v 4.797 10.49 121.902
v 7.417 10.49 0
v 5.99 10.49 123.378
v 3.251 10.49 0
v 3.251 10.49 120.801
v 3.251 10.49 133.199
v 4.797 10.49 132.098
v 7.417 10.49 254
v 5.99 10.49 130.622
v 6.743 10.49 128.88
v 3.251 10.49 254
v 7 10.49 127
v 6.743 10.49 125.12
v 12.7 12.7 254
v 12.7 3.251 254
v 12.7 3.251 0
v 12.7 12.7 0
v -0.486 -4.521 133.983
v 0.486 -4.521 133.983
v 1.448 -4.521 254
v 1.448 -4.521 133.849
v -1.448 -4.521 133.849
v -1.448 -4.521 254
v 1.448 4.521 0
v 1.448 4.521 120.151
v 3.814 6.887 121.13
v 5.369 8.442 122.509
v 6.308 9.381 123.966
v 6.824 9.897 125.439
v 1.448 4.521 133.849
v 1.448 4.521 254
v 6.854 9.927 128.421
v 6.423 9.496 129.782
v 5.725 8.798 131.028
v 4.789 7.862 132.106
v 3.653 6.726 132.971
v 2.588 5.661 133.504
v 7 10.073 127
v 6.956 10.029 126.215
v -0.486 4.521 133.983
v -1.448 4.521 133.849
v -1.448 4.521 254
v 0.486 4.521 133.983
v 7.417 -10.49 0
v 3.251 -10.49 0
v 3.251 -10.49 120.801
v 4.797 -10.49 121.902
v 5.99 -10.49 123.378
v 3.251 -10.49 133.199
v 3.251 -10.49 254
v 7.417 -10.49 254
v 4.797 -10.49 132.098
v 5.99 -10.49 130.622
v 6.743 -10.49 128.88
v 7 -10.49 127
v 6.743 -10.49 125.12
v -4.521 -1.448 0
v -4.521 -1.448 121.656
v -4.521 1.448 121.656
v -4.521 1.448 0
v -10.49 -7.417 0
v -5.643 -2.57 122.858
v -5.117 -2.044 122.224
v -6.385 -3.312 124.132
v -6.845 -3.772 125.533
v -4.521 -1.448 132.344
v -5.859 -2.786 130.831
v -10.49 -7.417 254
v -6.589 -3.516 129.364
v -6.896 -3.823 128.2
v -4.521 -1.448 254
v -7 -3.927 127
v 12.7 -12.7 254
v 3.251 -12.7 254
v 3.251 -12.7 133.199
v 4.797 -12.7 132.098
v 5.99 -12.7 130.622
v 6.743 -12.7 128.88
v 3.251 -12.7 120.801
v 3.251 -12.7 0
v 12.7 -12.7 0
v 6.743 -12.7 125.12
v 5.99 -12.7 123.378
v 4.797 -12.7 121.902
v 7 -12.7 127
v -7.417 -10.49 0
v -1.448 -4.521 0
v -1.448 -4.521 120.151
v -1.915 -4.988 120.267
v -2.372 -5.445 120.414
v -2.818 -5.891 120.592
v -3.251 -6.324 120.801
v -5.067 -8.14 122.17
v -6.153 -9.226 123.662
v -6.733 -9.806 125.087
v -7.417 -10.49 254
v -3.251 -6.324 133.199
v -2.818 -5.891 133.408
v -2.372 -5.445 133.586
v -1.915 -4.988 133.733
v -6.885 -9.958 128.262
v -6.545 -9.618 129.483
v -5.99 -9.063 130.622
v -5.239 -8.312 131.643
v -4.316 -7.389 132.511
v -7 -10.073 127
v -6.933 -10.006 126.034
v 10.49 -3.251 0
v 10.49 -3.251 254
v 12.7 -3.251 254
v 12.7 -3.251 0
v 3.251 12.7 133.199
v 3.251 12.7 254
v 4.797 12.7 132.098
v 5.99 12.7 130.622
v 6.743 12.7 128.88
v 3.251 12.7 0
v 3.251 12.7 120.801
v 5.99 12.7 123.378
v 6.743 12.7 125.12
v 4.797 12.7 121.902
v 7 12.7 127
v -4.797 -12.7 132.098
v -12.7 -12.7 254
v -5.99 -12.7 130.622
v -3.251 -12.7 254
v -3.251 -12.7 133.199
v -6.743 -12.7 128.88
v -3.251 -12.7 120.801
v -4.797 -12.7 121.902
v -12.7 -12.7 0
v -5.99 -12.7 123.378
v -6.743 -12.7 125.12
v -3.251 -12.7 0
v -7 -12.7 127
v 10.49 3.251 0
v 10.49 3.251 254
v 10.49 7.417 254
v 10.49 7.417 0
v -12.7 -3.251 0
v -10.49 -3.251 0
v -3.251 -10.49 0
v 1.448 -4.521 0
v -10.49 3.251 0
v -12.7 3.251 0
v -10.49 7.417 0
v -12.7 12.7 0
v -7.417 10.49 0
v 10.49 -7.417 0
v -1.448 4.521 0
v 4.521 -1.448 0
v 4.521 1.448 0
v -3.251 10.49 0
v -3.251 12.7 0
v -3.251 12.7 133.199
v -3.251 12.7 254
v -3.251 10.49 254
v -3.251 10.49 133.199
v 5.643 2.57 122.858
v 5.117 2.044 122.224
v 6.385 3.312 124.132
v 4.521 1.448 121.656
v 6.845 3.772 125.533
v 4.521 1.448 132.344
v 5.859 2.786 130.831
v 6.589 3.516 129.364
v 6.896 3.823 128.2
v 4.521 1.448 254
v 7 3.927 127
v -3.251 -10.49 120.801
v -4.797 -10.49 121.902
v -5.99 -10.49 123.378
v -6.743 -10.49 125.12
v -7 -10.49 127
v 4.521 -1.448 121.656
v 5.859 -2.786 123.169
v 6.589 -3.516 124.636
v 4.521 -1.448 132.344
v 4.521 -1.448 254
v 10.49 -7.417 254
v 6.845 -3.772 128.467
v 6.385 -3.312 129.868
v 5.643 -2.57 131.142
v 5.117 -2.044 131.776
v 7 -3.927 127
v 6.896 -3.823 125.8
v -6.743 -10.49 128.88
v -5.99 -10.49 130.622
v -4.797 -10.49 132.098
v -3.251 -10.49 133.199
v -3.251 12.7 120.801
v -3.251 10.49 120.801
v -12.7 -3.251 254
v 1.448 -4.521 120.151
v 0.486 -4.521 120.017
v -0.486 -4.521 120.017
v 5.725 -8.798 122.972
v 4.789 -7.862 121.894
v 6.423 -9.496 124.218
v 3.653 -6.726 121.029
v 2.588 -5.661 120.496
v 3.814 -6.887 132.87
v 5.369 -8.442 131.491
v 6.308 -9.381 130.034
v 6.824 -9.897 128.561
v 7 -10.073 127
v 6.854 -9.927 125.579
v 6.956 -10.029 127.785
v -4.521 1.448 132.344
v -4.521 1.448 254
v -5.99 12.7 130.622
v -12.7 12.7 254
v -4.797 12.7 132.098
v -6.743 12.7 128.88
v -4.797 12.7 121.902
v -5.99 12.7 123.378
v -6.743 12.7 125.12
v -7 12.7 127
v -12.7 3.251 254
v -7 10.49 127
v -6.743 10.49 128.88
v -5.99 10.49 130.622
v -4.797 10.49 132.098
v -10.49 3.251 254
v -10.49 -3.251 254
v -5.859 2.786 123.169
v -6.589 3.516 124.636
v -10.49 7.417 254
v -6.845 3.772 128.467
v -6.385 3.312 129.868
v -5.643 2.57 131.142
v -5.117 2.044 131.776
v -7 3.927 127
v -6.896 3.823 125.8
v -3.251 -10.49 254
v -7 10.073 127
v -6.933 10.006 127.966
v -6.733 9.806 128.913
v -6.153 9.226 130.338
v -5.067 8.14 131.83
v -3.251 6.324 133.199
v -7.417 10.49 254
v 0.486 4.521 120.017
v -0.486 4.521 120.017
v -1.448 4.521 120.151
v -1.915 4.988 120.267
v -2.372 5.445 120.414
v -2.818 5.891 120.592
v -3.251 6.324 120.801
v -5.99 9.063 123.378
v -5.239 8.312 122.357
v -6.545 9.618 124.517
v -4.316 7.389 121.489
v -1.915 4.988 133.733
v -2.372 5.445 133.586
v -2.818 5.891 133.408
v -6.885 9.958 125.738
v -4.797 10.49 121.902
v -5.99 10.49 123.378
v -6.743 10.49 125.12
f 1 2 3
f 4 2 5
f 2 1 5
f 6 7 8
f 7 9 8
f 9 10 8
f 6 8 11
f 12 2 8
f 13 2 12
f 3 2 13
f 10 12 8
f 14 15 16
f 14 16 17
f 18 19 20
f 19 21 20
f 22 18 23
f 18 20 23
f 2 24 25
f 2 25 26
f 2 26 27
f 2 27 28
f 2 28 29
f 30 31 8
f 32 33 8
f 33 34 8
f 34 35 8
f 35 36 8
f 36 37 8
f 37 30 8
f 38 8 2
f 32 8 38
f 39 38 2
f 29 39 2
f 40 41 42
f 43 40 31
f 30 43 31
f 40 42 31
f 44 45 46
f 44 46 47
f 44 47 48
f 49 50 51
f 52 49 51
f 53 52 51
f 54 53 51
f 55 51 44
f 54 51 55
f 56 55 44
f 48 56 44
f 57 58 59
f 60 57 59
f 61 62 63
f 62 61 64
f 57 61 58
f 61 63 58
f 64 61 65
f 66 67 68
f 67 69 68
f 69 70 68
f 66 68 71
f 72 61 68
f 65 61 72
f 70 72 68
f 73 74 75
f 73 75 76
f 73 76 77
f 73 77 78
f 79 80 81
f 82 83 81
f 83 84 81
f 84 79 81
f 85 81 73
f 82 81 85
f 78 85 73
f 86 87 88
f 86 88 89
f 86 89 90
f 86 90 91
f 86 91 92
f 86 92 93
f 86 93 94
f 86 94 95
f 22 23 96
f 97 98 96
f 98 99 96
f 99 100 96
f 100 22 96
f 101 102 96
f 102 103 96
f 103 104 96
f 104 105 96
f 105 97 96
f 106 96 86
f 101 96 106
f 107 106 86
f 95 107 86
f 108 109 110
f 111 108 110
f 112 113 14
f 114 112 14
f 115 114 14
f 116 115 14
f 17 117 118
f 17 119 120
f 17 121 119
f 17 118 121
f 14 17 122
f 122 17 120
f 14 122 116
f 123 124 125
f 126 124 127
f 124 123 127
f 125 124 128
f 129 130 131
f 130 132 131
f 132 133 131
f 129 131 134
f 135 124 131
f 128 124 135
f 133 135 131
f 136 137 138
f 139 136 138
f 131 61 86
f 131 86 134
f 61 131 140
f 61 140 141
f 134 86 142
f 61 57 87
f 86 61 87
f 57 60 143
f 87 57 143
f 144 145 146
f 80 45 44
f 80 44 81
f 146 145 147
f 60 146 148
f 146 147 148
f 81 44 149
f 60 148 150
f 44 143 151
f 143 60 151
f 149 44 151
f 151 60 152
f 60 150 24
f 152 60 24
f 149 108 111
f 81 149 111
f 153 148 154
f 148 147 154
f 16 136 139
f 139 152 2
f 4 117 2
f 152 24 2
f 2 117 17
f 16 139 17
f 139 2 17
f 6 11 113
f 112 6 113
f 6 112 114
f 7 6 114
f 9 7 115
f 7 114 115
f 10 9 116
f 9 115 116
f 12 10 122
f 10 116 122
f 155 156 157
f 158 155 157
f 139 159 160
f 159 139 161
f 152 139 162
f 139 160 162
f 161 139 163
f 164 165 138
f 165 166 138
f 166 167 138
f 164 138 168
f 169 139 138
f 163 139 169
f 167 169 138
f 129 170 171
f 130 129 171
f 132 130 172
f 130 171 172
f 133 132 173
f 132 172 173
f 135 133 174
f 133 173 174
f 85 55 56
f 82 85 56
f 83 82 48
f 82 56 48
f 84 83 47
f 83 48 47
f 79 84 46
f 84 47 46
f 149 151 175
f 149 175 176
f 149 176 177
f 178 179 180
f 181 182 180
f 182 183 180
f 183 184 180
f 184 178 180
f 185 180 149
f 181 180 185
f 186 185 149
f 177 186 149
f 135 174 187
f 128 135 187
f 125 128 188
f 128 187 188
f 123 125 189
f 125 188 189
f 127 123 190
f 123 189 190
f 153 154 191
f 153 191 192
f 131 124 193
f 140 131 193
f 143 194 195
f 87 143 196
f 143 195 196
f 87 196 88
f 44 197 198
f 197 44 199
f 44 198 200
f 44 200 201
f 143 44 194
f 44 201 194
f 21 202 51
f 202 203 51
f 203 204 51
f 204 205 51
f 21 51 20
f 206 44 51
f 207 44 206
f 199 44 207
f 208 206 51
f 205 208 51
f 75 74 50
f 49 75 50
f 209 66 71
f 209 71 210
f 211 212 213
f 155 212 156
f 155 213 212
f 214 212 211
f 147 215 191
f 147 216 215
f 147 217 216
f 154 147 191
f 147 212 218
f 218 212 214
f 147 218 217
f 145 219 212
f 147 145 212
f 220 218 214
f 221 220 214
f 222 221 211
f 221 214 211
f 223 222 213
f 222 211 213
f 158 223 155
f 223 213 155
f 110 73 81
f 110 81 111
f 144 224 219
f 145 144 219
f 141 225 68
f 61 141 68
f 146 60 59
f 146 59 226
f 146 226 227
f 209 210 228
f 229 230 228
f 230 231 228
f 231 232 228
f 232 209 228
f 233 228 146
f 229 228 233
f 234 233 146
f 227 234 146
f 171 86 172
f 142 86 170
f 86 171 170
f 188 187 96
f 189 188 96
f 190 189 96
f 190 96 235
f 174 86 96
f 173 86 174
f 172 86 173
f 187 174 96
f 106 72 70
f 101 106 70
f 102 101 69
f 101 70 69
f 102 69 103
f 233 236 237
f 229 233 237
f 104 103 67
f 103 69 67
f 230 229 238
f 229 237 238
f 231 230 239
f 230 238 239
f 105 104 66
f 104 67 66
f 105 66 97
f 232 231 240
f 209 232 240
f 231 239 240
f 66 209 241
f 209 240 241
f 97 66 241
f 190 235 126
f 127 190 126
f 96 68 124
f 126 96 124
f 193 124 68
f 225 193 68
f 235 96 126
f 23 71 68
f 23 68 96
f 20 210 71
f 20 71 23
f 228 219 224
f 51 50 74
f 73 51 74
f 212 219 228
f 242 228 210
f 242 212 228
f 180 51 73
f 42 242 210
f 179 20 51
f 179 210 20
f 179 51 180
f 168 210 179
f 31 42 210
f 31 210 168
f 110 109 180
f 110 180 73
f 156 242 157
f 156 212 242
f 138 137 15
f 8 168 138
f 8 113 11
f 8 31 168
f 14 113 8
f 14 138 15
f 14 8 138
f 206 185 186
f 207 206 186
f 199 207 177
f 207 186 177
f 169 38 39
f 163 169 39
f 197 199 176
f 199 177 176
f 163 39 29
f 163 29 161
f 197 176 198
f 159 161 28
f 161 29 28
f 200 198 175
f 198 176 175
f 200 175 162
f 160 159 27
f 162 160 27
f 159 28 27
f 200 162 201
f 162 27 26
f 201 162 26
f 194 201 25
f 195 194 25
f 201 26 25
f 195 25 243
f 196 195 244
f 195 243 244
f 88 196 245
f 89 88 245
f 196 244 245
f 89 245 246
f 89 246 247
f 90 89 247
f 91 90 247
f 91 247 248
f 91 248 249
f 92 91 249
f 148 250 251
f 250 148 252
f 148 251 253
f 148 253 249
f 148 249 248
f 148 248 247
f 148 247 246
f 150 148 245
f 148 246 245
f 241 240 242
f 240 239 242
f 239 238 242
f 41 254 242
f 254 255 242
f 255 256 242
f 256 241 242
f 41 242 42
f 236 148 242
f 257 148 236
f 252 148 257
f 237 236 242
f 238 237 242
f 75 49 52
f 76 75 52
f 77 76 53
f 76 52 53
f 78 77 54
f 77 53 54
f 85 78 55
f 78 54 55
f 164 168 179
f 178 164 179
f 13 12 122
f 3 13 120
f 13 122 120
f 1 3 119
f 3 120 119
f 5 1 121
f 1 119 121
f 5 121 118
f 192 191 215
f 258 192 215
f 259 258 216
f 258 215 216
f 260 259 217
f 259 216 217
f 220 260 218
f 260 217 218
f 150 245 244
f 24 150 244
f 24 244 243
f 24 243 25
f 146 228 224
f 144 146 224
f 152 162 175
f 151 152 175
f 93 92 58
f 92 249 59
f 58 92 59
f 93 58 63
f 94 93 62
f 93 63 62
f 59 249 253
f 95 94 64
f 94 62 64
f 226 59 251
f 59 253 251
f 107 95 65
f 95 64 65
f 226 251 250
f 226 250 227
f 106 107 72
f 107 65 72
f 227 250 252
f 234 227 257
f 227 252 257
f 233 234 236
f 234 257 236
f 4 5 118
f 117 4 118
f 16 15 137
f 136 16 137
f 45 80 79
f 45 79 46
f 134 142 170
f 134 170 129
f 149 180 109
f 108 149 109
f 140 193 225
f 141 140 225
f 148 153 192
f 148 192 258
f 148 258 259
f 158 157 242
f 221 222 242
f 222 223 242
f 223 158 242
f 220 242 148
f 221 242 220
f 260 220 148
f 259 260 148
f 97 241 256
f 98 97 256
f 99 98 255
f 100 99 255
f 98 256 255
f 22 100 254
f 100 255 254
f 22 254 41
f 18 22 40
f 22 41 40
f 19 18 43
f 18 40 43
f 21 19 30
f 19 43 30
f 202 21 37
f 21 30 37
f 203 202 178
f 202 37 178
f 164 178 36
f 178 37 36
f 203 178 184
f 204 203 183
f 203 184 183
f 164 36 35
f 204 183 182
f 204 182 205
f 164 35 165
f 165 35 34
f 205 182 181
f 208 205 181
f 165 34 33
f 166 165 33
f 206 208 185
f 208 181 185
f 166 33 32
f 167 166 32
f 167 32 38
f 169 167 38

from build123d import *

# Parameters (mm, degrees)
SKETCH1_W           = 25.4
SKETCH1_H           = 25.4
BOSS_EXTRUDE2_DEPTH = 254
CUT_EXTRUDE1_DEPTH  = 254
CUT_EXTRUDE2_DEPTH  = 250


with BuildPart() as part:
    # Sketch1 → Boss-Extrude2 (new body)
    with BuildSketch(Plane.XY):
        Rectangle(SKETCH1_W, SKETCH1_H)
    extrude(amount=BOSS_EXTRUDE2_DEPTH)

    # Sketch3 → Cut-Extrude1 (cut)
    with BuildSketch(Plane.XY.offset(254)):
        Polygon((-4.5212, -1.4482), (-4.5212, 1.4482), (-10.4902, 7.4172), (-10.4902, 3.2512), (-12.7, 3.2512), (-12.7, -3.2512), (-10.4902, -3.2512), (-10.4902, -7.4172), align=None)
        Polygon((-7.4172, 10.4902), (-1.4482, 4.5212), (1.4482, 4.5212), (7.4172, 10.4902), (3.2512, 10.4902), (3.2512, 12.7), (0, 12.7), (-3.2512, 12.7), (-3.2512, 10.4902), align=None)
        Polygon((10.4902, 7.4172), (4.5212, 1.4482), (4.5212, -1.4482), (10.4902, -7.4172), (10.4902, -3.2512), (12.7, -3.2512), (12.7, 3.2512), (10.4902, 3.2512), align=None)
        Polygon((1.4482, -4.5212), (-1.4482, -4.5212), (-7.4172, -10.4902), (-3.2512, -10.4902), (-3.2512, -12.7), (3.2512, -12.7), (3.2512, -10.4902), (7.4172, -10.4902), align=None)
    extrude(amount=-CUT_EXTRUDE1_DEPTH, mode=Mode.SUBTRACT)

    # Sketch5 → Cut-Extrude2 (cut)
    with BuildSketch(Plane(origin=(0, 12.7, 0), x_dir=(1, 0, 0), z_dir=(0, 1, 0))):
        with BuildLine():
            ThreePointArc((-3.2512, -120.800830817), (-5.989924874, -123.377735515), (-7, -127))
            Line((-7, -127), (-3.2512, -127))
            Line((-3.2512, -127), (-3.2512, -120.800830817))
        make_face()
        with BuildLine():
            Line((-3.2512, -127), (-7, -127))
            ThreePointArc((-7, -127), (-5.989924874, -130.622264485), (-3.2512, -133.199169183))
            Line((-3.2512, -133.199169183), (-3.2512, -127))
        make_face()
        with BuildLine():
            Line((-3.2512, -120.800830817), (-3.2512, -127))
            Line((-3.2512, -127), (7, -127))
            ThreePointArc((7, -127), (3.622264485, -121.010075126), (-3.2512, -120.800830817))
        make_face()
        with BuildLine():
            Line((7, -127), (-3.2512, -127))
            Line((-3.2512, -127), (-3.2512, -133.199169183))
            ThreePointArc((-3.2512, -133.199169183), (3.622264485, -132.989924874), (7, -127))
        make_face()
    extrude(amount=-CUT_EXTRUDE2_DEPTH, mode=Mode.SUBTRACT)


solid = part.part
